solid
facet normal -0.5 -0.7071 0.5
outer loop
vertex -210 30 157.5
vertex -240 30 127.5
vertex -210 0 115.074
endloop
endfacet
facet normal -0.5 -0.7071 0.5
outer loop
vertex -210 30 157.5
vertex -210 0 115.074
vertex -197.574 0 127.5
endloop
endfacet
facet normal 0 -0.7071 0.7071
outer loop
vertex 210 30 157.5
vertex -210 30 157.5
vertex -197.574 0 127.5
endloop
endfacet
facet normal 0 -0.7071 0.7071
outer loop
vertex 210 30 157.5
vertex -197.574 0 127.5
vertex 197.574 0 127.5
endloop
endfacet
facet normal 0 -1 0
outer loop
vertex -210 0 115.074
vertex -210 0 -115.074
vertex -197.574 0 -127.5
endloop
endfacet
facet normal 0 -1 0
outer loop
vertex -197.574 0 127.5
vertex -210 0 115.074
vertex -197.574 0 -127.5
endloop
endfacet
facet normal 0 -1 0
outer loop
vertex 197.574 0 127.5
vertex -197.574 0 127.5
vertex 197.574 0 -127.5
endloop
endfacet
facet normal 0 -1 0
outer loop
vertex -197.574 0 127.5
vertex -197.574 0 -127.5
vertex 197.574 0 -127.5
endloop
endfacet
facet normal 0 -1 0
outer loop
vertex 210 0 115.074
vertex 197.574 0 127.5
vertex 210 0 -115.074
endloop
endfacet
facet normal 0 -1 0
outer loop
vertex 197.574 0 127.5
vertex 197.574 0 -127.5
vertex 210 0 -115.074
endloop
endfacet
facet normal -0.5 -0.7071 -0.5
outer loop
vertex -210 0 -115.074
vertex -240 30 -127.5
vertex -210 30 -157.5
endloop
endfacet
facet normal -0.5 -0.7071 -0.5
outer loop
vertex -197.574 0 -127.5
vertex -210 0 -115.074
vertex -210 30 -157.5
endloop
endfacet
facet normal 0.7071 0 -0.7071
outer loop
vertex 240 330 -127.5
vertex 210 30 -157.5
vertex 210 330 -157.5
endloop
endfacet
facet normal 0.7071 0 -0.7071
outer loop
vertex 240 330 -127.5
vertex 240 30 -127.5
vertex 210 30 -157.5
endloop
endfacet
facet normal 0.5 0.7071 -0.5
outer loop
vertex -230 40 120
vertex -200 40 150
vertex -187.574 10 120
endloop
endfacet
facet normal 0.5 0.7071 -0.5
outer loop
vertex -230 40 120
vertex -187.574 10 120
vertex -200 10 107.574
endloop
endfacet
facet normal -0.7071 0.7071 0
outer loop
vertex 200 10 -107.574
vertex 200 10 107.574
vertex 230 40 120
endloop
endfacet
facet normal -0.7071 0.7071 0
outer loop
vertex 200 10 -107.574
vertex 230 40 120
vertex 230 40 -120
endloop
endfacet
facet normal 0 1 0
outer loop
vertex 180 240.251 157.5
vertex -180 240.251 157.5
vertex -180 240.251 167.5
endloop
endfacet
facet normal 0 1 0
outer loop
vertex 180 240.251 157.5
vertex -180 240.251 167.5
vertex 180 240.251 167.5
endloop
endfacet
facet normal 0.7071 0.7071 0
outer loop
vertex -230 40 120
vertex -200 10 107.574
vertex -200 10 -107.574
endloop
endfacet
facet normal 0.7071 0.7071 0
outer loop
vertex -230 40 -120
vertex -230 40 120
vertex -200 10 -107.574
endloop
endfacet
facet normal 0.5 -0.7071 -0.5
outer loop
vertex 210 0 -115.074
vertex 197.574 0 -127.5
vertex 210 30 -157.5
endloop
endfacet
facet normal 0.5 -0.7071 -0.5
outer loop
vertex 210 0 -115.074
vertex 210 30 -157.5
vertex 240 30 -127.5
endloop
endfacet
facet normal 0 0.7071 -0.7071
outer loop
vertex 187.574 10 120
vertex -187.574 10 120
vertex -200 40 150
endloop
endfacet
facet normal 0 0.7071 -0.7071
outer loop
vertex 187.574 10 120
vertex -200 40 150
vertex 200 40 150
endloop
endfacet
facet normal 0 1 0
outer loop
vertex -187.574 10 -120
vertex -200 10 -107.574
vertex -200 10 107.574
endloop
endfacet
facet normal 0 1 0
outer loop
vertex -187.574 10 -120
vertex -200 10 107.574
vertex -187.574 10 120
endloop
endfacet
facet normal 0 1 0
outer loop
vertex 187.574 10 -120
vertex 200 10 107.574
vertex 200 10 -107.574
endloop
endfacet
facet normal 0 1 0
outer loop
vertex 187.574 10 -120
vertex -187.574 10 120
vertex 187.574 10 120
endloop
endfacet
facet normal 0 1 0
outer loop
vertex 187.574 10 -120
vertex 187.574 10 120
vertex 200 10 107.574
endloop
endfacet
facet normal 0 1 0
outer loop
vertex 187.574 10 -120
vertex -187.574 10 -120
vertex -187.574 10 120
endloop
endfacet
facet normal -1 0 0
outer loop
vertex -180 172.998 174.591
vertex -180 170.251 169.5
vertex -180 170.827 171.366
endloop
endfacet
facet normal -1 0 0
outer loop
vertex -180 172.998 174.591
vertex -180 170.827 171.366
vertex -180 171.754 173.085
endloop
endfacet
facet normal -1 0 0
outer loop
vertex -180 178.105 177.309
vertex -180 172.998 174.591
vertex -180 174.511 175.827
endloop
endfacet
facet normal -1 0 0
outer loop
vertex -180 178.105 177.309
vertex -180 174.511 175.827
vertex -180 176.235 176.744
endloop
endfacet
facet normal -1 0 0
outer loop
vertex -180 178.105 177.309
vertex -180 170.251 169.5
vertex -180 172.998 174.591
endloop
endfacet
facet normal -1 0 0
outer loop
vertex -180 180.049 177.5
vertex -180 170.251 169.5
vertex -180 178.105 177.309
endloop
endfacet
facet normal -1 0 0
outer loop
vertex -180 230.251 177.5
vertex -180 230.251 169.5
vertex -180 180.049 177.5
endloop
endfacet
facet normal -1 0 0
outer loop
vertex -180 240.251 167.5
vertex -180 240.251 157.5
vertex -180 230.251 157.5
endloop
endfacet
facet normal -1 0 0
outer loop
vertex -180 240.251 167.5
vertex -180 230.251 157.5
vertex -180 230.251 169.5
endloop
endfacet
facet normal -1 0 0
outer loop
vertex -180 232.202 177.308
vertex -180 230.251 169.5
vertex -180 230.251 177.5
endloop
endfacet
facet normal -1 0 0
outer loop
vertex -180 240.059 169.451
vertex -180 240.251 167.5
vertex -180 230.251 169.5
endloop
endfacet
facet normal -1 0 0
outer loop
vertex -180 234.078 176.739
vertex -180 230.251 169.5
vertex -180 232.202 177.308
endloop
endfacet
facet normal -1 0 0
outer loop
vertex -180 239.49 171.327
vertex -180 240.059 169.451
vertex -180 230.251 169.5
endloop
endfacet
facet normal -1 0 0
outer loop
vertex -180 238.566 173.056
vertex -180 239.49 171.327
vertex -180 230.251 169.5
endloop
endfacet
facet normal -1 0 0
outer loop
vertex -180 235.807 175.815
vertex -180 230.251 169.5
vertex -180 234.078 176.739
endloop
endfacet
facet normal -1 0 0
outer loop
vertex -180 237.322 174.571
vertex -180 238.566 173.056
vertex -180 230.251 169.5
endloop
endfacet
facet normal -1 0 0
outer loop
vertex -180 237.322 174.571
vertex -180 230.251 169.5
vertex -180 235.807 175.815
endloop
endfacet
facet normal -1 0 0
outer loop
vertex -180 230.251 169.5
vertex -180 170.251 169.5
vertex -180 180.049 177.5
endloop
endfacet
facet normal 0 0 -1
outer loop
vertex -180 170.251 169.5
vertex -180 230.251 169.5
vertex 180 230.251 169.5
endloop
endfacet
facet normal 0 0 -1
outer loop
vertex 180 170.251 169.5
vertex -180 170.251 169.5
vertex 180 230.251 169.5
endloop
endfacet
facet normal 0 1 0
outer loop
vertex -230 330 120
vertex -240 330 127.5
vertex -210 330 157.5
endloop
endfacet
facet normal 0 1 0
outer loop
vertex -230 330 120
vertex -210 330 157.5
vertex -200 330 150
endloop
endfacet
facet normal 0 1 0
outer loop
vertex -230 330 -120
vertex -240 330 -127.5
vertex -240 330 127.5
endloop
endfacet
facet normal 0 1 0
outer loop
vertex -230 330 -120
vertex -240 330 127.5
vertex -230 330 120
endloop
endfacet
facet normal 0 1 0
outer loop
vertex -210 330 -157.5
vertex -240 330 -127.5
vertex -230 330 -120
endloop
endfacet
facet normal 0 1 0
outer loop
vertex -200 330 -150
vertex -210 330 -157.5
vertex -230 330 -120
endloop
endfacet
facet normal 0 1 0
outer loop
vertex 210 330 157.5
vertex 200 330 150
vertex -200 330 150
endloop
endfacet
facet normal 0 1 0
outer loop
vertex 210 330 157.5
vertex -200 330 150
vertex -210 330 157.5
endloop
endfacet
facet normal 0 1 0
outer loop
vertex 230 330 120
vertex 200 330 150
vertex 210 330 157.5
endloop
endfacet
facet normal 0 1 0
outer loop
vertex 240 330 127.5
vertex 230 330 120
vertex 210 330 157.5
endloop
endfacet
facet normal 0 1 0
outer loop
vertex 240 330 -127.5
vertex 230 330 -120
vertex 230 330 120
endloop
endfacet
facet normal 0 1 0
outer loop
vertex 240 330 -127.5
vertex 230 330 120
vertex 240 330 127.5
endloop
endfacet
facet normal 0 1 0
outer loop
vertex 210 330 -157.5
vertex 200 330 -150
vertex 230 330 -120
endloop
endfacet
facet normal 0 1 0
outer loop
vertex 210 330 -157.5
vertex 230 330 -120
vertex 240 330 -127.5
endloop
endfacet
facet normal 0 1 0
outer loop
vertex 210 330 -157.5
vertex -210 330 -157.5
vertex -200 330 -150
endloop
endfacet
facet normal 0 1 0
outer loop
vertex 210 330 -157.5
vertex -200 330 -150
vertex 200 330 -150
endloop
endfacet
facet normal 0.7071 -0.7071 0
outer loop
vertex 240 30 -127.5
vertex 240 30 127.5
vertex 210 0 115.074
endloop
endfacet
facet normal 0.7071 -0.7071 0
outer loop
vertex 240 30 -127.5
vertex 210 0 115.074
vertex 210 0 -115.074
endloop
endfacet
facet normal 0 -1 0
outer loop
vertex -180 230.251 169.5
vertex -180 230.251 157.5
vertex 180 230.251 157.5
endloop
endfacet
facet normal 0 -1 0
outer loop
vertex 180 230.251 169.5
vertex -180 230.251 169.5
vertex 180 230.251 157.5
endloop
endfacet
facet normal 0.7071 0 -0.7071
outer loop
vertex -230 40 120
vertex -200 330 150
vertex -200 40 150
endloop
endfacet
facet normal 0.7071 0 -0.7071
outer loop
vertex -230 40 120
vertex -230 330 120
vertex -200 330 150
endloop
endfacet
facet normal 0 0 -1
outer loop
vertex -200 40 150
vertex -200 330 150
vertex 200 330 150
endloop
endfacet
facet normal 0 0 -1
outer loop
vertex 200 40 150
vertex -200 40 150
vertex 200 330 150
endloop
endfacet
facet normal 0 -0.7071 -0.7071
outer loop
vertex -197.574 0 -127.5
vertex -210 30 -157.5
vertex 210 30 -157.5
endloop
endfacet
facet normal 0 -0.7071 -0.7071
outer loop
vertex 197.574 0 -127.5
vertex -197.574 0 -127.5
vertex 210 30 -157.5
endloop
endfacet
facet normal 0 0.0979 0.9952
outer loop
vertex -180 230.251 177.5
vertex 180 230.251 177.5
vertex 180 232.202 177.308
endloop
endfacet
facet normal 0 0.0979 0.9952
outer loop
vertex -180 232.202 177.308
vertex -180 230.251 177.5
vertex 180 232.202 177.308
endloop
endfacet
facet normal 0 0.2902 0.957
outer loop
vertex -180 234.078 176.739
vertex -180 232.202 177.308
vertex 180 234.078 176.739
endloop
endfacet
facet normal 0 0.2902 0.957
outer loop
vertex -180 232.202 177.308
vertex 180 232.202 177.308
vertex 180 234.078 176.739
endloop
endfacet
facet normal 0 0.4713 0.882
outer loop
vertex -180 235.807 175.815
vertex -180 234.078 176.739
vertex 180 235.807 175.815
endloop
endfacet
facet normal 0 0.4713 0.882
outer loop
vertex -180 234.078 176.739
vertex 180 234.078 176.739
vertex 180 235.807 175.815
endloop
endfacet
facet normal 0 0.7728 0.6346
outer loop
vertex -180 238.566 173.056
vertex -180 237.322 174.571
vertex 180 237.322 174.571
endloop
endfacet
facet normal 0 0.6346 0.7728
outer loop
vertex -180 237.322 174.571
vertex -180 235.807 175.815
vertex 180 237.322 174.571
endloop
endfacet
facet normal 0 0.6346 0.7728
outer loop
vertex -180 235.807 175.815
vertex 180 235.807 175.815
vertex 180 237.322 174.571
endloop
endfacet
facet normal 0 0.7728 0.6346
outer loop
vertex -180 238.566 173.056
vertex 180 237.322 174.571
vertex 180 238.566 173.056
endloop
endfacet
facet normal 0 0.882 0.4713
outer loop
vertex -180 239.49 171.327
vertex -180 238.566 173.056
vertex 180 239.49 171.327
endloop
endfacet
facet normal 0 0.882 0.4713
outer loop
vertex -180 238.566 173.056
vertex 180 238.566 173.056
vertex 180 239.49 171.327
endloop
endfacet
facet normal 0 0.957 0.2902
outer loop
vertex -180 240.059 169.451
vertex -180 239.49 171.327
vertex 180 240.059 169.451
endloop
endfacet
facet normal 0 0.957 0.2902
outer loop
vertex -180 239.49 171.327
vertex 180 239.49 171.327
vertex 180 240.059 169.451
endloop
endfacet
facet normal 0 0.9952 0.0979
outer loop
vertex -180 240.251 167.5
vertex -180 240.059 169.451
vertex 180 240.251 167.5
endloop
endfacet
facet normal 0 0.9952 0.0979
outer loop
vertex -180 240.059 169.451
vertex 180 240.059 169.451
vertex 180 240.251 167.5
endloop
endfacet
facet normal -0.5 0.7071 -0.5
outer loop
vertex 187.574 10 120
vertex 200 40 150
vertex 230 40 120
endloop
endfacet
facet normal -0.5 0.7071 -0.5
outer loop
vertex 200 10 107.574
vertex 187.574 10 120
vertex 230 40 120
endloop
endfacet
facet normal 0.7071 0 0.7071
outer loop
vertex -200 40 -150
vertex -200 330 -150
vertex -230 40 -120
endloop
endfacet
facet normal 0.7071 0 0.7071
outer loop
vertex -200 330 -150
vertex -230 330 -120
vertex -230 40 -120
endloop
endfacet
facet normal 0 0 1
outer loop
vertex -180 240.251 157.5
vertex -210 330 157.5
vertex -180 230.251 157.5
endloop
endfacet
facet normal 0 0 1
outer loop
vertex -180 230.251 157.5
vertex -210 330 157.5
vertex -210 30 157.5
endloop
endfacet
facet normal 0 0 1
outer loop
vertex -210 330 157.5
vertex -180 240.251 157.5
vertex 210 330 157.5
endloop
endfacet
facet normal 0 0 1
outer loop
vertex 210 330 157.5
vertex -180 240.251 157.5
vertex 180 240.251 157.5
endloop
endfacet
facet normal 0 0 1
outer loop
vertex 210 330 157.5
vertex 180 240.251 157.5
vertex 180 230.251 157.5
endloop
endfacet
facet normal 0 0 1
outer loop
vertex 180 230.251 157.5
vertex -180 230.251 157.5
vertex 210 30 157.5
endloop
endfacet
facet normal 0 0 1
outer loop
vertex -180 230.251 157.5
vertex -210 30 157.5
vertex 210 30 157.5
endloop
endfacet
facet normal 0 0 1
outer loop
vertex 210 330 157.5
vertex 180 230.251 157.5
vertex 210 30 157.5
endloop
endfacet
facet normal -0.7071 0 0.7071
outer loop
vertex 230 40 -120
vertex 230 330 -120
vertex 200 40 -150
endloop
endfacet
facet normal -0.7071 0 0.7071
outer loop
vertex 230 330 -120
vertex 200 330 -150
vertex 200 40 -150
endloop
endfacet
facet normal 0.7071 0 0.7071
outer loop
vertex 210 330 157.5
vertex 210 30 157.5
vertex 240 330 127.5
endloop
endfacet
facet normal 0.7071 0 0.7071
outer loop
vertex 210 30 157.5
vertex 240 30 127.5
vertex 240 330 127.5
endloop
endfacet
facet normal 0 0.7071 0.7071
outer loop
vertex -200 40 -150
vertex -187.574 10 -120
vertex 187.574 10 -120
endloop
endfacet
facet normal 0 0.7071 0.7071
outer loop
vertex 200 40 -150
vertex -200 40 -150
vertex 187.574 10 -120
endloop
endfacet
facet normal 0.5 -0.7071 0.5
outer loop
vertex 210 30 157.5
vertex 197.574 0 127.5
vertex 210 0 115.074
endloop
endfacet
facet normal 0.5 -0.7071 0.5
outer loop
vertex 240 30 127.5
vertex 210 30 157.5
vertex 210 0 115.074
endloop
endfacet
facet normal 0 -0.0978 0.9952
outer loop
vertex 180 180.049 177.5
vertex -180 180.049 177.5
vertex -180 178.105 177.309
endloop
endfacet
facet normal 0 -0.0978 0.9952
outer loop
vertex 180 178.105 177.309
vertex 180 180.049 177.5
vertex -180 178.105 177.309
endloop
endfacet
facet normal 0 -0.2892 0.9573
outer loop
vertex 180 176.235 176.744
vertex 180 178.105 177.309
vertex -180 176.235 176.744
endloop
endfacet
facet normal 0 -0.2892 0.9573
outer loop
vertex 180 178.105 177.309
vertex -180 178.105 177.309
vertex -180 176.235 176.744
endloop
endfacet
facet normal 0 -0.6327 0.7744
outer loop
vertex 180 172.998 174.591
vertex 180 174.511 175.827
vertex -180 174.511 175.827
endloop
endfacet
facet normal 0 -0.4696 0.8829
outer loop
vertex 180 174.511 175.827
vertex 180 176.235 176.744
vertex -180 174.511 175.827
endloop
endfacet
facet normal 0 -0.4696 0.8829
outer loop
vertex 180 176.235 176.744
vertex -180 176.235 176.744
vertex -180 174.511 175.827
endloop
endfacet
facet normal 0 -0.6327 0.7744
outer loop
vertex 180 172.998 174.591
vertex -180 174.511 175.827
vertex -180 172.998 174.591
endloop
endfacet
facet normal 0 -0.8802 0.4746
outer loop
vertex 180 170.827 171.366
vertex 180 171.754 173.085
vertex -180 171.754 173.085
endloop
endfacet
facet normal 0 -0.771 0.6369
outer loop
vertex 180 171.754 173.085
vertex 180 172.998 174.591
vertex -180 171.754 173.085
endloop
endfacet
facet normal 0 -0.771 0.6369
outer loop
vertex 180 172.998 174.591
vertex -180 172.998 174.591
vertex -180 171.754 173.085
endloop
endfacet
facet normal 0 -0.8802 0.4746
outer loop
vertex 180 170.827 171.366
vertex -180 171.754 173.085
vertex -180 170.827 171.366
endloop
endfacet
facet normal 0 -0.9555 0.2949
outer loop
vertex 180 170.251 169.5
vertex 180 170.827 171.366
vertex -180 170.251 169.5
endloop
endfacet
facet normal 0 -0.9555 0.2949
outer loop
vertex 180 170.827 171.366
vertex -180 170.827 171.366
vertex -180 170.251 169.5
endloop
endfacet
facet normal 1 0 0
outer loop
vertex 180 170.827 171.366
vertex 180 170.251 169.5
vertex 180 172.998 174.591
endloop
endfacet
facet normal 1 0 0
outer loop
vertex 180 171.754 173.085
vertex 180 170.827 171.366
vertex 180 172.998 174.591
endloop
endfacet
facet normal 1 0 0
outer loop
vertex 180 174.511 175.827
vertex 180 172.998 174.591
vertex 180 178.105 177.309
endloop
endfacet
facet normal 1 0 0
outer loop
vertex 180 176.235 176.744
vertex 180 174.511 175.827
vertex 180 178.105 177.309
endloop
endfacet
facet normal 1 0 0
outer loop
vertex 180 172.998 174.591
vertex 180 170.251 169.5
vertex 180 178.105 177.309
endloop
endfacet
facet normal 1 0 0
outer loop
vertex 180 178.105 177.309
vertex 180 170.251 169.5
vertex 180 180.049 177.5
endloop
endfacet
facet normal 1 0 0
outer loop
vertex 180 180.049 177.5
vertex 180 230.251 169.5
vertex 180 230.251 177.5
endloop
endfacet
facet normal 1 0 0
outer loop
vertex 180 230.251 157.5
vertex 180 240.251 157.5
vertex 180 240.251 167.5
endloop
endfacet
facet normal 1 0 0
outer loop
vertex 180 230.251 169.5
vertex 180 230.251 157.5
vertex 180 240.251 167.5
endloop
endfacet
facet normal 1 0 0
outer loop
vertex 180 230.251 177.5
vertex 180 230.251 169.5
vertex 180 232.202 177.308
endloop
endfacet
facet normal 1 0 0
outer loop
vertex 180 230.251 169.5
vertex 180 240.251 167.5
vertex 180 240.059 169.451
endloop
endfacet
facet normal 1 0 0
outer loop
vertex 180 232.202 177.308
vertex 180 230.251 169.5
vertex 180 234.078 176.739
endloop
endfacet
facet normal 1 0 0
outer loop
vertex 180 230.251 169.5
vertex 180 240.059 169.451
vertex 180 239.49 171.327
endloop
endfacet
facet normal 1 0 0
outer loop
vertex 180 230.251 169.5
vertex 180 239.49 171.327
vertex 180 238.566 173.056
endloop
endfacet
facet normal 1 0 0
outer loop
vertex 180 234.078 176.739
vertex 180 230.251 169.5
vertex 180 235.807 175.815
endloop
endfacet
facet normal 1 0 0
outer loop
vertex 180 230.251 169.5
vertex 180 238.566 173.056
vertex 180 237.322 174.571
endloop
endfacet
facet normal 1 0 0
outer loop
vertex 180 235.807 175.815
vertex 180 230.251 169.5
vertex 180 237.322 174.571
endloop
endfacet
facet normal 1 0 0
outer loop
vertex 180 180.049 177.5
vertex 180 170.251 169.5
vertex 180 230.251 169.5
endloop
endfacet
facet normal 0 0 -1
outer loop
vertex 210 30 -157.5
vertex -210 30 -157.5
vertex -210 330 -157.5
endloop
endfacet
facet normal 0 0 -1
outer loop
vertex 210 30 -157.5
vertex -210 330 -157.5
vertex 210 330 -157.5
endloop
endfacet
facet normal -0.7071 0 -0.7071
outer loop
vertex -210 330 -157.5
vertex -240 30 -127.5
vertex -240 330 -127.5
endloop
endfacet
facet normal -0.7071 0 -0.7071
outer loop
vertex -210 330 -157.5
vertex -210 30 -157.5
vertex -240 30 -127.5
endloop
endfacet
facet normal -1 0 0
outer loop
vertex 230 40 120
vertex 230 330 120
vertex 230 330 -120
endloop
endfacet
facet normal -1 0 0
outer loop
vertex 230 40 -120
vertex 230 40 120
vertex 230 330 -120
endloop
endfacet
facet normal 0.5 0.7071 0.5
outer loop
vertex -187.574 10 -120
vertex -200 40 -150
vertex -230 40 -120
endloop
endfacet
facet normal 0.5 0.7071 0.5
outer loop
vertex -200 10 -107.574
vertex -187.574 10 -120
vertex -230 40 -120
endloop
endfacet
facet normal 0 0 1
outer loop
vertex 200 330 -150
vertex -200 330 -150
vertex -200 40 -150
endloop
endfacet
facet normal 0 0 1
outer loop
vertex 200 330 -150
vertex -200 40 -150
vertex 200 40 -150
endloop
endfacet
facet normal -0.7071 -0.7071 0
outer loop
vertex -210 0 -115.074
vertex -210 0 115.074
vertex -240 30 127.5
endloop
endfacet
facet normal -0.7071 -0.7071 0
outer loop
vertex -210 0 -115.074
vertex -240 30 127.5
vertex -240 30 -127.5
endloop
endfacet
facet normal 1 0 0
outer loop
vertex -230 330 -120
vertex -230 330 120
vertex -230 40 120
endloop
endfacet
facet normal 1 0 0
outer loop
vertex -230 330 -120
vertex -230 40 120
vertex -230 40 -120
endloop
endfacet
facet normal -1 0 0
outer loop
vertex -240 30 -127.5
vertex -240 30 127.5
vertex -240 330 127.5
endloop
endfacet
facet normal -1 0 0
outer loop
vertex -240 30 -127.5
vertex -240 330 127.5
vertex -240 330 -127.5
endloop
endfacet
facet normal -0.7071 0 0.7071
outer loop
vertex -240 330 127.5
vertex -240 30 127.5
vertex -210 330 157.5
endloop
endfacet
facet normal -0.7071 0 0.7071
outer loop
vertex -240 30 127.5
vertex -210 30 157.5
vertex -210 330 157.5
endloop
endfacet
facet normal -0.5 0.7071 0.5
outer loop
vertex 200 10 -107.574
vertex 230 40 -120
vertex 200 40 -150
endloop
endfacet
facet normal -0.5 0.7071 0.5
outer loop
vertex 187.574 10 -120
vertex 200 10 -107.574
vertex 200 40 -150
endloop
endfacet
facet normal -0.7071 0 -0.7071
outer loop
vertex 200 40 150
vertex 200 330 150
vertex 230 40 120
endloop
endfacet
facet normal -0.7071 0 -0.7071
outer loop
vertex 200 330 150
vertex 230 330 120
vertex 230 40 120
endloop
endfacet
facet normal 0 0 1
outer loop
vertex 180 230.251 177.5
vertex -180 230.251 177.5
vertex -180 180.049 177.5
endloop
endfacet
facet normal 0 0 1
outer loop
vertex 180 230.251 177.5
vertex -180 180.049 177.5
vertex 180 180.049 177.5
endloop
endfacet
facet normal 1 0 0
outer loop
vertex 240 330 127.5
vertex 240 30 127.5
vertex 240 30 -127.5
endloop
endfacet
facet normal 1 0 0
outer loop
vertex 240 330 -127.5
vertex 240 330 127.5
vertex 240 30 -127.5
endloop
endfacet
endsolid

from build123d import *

# Parameters (mm, degrees)
SKETCH1_W           = 480
SKETCH1_H           = 315
BOSS_EXTRUDE1_DEPTH = 330
SKETCH9_W           = 460
SKETCH9_H           = 300
CUT_EXTRUDE1_DEPTH  = 320
CHAMFER1_SIZE       = 30
CHAMFER2_SIZE       = 30
SKETCH11_W          = 360
SKETCH11_H          = 10
BOSS_EXTRUDE2_DEPTH = 20
SKETCH12_W          = 360
SKETCH12_H          = 8
BOSS_EXTRUDE3_DEPTH = 60
FILLET1_R           = 10


with BuildPart() as part:
    # Sketch1 → Boss-Extrude1 (new body)
    with BuildSketch(Plane(origin=(0, 0, 0), x_dir=(1, 0, 0), z_dir=(0, 1, 0))):
        Rectangle(SKETCH1_W, SKETCH1_H)
    extrude(amount=BOSS_EXTRUDE1_DEPTH)

    # Sketch9 → Cut-Extrude1 (cut)
    with BuildSketch(Plane(origin=(0, 330, 0), x_dir=(1, 0, 0), z_dir=(0, 1, 0))):
        Rectangle(SKETCH9_W, SKETCH9_H)
    extrude(amount=-CUT_EXTRUDE1_DEPTH, mode=Mode.SUBTRACT)

    # Chamfer1
    chamfer1_edges = [part.edges().sort_by_distance(p)[0] for p in [
        (230, 170, -150),
        (230, 170, 150),
        (-230, 170, 150),
        (-230, 170, -150),
        (-240, 165, -157.5),
        (240, 165, -157.5),
        (240, 165, 157.5),
        (-240, 165, 157.5),
    ]]
    chamfer(chamfer1_edges, length=CHAMFER1_SIZE)

    # Chamfer2
    chamfer2_edges = [part.edges().sort_by_distance(p)[0] for p in [
        (0, 0, -157.5),
        (-240, 0, 0),
        (240, 0, 0),
        (0, 0, 157.5),
        (225, 0, 142.5),
        (-225, 0, 142.5),
        (-225, 0, -142.5),
        (225, 0, -142.5),
        (230, 10, 0),
        (0, 10, 150),
        (0, 10, -150),
        (-230, 10, 0),
        (215, 10, -135),
        (-215, 10, -135),
        (-215, 10, 135),
        (215, 10, 135),
    ]]
    chamfer(chamfer2_edges, length=CHAMFER2_SIZE)

    # Sketch11 → Boss-Extrude2 (add)
    with BuildSketch(Plane.XY.offset(157.5)):
        with Locations((0, 235.251091022)):
            Rectangle(SKETCH11_W, SKETCH11_H)
    extrude(amount=BOSS_EXTRUDE2_DEPTH)

    # Sketch12 → Boss-Extrude3 (add)
    with BuildSketch(Plane.XZ.offset(-230.251091022)):
        with Locations((0, 173.5)):
            Rectangle(SKETCH12_W, SKETCH12_H)
    extrude(amount=BOSS_EXTRUDE3_DEPTH)

    # Fillet1
    # the kernel refuses this fillet: 10 mm, written as the material it takes off along each edge
    with BuildSketch(Plane(origin=(-204.494897428, 170.251091022, 177.5), x_dir=(0, 0, -1), z_dir=(1, 0, 0))) as fillet1_piece_1:
        with BuildLine():
            CenterArc((10, 9.797958971), FILLET1_R, 180, 78.463040967)
            Line((0, 9.797958971), (-0.2, 9.797958971))
            Line((-0.2, 9.797958971), (-0.2, 0))
            Line((-0.2, 0), (0, -0.2))
            ThreePointArc((0, -0.2), (4, -0.2), (7.96, -0.195959179))
            Line((7.96, -0.195959179), (8, 0))
        make_face()
    extrude(amount=408.989794856, mode=Mode.SUBTRACT)
    with BuildSketch(Plane(origin=(205, 240.251091022, 177.5), x_dir=(0, -1, 0), z_dir=(-1, 0, 0))) as fillet1_piece_2:
        with BuildLine():
            CenterArc((FILLET1_R, -FILLET1_R), FILLET1_R, 90, 90)
            Line((0, -FILLET1_R), (-FILLET1_R * 0.02, -FILLET1_R))
            Line((-FILLET1_R * 0.02, -FILLET1_R), (-FILLET1_R * 0.02, FILLET1_R * 0.02))
            Line((-FILLET1_R * 0.02, FILLET1_R * 0.02), (FILLET1_R, FILLET1_R * 0.02))
            Line((FILLET1_R, FILLET1_R * 0.02), (FILLET1_R, 0))
        make_face()
    extrude(amount=410, mode=Mode.SUBTRACT)


solid = part.part
